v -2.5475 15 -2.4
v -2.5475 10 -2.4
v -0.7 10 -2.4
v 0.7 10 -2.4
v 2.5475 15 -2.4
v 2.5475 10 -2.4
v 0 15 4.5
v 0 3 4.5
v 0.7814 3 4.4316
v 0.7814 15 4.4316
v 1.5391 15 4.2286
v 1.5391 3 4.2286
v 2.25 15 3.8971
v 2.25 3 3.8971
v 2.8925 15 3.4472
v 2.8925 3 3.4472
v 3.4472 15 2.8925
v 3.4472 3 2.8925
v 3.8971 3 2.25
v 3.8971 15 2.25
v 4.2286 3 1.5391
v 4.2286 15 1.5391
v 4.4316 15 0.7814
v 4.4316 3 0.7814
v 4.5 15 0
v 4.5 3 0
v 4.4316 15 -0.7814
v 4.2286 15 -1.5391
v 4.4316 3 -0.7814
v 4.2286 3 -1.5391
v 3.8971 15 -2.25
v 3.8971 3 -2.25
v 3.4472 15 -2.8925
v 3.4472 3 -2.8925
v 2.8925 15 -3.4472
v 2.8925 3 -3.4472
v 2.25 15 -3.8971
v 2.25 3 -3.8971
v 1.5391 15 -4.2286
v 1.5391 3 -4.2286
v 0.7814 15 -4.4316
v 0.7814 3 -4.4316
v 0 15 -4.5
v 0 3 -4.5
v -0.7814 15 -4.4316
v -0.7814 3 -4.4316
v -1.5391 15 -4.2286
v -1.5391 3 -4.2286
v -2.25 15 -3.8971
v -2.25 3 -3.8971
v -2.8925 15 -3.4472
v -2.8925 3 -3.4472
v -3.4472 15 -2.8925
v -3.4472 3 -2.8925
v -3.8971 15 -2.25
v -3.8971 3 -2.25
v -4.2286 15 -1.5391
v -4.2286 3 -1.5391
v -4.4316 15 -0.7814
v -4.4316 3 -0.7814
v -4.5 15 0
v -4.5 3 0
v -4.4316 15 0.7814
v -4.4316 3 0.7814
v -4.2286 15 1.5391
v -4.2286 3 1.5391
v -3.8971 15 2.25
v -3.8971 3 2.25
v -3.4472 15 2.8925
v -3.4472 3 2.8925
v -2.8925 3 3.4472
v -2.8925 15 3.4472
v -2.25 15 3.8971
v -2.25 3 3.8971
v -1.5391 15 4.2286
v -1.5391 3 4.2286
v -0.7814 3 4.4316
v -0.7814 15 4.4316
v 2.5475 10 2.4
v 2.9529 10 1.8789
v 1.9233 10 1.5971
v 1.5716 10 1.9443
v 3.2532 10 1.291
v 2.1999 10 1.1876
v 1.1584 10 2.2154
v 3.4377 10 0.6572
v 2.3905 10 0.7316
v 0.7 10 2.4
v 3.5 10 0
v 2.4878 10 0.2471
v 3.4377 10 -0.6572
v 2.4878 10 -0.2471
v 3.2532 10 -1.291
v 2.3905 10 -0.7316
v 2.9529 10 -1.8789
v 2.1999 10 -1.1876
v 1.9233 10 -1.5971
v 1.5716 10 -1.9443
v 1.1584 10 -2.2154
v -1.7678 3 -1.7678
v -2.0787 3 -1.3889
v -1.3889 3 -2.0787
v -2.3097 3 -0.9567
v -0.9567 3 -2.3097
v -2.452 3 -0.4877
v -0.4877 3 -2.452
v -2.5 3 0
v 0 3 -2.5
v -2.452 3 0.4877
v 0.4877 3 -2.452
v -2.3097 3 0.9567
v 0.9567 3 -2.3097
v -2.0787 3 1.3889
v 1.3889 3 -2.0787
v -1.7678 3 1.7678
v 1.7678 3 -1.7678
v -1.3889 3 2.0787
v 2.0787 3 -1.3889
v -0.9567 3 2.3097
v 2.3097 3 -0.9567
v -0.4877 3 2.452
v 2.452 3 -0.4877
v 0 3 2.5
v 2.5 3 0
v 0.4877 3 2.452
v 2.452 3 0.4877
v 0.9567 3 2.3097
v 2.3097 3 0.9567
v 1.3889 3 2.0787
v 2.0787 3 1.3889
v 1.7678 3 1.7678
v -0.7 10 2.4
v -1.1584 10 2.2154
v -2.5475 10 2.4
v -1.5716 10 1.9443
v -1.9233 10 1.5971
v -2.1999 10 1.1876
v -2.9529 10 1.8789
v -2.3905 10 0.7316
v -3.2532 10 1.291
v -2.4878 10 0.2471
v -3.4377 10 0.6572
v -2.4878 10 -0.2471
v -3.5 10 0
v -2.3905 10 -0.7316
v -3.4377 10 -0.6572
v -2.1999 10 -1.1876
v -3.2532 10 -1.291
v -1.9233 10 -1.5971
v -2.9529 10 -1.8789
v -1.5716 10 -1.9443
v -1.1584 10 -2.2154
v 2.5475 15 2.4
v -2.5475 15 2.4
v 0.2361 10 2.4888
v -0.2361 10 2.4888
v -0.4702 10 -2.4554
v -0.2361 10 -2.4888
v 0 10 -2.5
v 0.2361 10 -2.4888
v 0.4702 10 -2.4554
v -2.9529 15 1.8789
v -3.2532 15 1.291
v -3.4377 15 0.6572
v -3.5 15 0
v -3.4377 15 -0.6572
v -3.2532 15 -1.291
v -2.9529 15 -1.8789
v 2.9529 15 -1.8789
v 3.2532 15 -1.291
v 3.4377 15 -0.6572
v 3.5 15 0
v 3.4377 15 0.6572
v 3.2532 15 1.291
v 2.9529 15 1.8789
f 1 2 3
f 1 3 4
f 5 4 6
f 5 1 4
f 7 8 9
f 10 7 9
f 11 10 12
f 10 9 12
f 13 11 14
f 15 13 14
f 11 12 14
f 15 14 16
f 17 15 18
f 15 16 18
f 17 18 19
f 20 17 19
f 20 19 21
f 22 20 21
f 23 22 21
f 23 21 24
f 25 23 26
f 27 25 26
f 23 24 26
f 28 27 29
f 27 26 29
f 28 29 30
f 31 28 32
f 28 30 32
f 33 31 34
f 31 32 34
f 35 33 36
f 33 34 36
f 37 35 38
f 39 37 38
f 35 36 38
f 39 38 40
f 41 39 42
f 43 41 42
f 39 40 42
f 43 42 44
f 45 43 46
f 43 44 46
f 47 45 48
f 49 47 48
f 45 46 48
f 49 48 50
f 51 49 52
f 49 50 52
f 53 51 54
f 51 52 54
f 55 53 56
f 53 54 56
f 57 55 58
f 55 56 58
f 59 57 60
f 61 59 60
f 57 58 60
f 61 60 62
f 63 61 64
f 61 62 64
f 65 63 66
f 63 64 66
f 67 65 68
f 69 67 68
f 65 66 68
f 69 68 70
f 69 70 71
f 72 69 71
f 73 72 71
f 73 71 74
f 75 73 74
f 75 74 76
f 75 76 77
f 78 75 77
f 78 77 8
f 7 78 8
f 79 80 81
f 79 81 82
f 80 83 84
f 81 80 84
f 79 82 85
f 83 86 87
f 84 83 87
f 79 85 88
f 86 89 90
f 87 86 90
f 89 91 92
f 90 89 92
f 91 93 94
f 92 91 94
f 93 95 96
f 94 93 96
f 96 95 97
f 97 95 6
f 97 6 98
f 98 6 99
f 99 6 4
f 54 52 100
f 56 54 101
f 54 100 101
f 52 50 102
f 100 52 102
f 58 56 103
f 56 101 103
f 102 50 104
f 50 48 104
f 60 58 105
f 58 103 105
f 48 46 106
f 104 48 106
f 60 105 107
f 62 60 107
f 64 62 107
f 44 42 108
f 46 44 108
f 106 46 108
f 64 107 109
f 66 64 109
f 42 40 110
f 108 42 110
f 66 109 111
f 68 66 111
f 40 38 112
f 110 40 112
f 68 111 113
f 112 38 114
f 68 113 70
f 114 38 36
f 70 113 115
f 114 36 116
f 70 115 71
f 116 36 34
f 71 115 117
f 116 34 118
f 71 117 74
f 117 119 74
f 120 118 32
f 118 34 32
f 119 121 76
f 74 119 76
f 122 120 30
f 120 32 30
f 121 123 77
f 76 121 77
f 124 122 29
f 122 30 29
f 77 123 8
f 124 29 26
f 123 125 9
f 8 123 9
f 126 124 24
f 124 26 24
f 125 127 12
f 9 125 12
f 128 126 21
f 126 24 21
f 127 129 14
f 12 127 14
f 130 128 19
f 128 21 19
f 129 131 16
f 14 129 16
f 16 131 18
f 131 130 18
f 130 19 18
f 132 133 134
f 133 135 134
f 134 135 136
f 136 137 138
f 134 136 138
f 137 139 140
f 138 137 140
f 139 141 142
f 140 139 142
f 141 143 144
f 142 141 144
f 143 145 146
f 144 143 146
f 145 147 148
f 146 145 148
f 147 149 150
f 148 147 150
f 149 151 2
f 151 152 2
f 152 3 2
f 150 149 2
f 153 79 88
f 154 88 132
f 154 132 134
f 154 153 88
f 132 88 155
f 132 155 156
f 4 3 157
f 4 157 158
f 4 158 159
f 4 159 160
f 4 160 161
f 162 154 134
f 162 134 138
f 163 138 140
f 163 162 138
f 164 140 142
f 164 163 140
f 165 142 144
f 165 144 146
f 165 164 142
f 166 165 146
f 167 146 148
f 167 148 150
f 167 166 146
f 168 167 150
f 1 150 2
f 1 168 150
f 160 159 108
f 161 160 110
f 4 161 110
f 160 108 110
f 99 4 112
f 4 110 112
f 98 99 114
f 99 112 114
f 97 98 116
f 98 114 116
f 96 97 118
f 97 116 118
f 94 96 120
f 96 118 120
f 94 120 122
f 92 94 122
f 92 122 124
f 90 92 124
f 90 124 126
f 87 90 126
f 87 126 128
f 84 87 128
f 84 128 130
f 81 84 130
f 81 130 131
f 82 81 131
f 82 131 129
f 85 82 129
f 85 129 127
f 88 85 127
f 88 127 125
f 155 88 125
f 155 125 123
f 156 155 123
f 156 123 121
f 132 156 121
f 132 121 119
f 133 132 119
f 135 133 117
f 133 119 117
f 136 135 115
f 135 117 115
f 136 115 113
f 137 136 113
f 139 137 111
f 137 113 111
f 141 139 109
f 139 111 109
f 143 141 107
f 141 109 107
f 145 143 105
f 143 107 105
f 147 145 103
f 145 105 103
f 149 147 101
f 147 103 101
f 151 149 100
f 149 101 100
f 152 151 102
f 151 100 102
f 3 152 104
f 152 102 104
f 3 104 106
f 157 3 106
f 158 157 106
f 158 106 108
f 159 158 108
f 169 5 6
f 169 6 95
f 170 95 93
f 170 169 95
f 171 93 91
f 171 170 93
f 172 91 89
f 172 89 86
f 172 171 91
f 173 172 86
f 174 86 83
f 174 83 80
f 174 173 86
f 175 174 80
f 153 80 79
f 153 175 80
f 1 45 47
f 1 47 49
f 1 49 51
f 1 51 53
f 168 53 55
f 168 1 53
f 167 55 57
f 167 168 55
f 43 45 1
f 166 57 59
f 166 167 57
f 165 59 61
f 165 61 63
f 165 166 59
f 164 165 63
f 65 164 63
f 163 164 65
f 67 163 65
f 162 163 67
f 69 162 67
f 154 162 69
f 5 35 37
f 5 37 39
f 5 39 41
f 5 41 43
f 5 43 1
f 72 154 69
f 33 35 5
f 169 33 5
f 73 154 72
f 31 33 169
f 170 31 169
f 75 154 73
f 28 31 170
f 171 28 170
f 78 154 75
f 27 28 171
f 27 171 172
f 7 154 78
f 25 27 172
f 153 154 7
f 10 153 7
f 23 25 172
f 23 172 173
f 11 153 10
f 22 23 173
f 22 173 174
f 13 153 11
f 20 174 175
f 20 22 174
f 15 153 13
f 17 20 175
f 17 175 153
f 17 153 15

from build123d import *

# Parameters (mm, degrees)
EXTRUDE_START       = 3
SKETCH_1_R          = 4.5
EXTRUDE_1_DEPTH     = 12
CUT_EXTRUDE_3_DEPTH = 5
SKETCH_3_R          = 2.5
CUT_EXTRUDE_4_DEPTH = 7


with BuildPart() as part:
    # Эскиз1 → Вытянуть1 (new body)
    with BuildSketch(Plane(origin=(0, 0, 0), x_dir=(1, 0, 0), z_dir=(0, 1, 0)).offset(EXTRUDE_START)):
        with Locations(Location((0, 0, 0), (0, 0, 270))):
            Circle(SKETCH_1_R)
    extrude(amount=EXTRUDE_1_DEPTH)

    # Эскиз2 → Вытянуть3 (cut)
    with BuildSketch(Plane(origin=(0, 15, 0), x_dir=(1, 0, 0), z_dir=(0, 1, 0))):
        with BuildLine():
            Line((-2.547547841, 2.4), (2.547547841, 2.4))
            ThreePointArc((2.547547841, 2.4), (3.5, 0), (2.547547841, -2.4))
            Line((2.547547841, -2.4), (-2.547547841, -2.4))
            ThreePointArc((-2.547547841, -2.4), (-3.5, 0), (-2.547547841, 2.4))
        make_face()
    extrude(amount=-CUT_EXTRUDE_3_DEPTH, mode=Mode.SUBTRACT)

    # Эскиз3 → Вытянуть4 (cut)
    with BuildSketch(Plane.XZ.offset(-3)):
        with Locations(Location((0, 0, 0), (0, 0, 270))):
            Circle(SKETCH_3_R)
    extrude(amount=-CUT_EXTRUDE_4_DEPTH, mode=Mode.SUBTRACT)


solid = part.part
